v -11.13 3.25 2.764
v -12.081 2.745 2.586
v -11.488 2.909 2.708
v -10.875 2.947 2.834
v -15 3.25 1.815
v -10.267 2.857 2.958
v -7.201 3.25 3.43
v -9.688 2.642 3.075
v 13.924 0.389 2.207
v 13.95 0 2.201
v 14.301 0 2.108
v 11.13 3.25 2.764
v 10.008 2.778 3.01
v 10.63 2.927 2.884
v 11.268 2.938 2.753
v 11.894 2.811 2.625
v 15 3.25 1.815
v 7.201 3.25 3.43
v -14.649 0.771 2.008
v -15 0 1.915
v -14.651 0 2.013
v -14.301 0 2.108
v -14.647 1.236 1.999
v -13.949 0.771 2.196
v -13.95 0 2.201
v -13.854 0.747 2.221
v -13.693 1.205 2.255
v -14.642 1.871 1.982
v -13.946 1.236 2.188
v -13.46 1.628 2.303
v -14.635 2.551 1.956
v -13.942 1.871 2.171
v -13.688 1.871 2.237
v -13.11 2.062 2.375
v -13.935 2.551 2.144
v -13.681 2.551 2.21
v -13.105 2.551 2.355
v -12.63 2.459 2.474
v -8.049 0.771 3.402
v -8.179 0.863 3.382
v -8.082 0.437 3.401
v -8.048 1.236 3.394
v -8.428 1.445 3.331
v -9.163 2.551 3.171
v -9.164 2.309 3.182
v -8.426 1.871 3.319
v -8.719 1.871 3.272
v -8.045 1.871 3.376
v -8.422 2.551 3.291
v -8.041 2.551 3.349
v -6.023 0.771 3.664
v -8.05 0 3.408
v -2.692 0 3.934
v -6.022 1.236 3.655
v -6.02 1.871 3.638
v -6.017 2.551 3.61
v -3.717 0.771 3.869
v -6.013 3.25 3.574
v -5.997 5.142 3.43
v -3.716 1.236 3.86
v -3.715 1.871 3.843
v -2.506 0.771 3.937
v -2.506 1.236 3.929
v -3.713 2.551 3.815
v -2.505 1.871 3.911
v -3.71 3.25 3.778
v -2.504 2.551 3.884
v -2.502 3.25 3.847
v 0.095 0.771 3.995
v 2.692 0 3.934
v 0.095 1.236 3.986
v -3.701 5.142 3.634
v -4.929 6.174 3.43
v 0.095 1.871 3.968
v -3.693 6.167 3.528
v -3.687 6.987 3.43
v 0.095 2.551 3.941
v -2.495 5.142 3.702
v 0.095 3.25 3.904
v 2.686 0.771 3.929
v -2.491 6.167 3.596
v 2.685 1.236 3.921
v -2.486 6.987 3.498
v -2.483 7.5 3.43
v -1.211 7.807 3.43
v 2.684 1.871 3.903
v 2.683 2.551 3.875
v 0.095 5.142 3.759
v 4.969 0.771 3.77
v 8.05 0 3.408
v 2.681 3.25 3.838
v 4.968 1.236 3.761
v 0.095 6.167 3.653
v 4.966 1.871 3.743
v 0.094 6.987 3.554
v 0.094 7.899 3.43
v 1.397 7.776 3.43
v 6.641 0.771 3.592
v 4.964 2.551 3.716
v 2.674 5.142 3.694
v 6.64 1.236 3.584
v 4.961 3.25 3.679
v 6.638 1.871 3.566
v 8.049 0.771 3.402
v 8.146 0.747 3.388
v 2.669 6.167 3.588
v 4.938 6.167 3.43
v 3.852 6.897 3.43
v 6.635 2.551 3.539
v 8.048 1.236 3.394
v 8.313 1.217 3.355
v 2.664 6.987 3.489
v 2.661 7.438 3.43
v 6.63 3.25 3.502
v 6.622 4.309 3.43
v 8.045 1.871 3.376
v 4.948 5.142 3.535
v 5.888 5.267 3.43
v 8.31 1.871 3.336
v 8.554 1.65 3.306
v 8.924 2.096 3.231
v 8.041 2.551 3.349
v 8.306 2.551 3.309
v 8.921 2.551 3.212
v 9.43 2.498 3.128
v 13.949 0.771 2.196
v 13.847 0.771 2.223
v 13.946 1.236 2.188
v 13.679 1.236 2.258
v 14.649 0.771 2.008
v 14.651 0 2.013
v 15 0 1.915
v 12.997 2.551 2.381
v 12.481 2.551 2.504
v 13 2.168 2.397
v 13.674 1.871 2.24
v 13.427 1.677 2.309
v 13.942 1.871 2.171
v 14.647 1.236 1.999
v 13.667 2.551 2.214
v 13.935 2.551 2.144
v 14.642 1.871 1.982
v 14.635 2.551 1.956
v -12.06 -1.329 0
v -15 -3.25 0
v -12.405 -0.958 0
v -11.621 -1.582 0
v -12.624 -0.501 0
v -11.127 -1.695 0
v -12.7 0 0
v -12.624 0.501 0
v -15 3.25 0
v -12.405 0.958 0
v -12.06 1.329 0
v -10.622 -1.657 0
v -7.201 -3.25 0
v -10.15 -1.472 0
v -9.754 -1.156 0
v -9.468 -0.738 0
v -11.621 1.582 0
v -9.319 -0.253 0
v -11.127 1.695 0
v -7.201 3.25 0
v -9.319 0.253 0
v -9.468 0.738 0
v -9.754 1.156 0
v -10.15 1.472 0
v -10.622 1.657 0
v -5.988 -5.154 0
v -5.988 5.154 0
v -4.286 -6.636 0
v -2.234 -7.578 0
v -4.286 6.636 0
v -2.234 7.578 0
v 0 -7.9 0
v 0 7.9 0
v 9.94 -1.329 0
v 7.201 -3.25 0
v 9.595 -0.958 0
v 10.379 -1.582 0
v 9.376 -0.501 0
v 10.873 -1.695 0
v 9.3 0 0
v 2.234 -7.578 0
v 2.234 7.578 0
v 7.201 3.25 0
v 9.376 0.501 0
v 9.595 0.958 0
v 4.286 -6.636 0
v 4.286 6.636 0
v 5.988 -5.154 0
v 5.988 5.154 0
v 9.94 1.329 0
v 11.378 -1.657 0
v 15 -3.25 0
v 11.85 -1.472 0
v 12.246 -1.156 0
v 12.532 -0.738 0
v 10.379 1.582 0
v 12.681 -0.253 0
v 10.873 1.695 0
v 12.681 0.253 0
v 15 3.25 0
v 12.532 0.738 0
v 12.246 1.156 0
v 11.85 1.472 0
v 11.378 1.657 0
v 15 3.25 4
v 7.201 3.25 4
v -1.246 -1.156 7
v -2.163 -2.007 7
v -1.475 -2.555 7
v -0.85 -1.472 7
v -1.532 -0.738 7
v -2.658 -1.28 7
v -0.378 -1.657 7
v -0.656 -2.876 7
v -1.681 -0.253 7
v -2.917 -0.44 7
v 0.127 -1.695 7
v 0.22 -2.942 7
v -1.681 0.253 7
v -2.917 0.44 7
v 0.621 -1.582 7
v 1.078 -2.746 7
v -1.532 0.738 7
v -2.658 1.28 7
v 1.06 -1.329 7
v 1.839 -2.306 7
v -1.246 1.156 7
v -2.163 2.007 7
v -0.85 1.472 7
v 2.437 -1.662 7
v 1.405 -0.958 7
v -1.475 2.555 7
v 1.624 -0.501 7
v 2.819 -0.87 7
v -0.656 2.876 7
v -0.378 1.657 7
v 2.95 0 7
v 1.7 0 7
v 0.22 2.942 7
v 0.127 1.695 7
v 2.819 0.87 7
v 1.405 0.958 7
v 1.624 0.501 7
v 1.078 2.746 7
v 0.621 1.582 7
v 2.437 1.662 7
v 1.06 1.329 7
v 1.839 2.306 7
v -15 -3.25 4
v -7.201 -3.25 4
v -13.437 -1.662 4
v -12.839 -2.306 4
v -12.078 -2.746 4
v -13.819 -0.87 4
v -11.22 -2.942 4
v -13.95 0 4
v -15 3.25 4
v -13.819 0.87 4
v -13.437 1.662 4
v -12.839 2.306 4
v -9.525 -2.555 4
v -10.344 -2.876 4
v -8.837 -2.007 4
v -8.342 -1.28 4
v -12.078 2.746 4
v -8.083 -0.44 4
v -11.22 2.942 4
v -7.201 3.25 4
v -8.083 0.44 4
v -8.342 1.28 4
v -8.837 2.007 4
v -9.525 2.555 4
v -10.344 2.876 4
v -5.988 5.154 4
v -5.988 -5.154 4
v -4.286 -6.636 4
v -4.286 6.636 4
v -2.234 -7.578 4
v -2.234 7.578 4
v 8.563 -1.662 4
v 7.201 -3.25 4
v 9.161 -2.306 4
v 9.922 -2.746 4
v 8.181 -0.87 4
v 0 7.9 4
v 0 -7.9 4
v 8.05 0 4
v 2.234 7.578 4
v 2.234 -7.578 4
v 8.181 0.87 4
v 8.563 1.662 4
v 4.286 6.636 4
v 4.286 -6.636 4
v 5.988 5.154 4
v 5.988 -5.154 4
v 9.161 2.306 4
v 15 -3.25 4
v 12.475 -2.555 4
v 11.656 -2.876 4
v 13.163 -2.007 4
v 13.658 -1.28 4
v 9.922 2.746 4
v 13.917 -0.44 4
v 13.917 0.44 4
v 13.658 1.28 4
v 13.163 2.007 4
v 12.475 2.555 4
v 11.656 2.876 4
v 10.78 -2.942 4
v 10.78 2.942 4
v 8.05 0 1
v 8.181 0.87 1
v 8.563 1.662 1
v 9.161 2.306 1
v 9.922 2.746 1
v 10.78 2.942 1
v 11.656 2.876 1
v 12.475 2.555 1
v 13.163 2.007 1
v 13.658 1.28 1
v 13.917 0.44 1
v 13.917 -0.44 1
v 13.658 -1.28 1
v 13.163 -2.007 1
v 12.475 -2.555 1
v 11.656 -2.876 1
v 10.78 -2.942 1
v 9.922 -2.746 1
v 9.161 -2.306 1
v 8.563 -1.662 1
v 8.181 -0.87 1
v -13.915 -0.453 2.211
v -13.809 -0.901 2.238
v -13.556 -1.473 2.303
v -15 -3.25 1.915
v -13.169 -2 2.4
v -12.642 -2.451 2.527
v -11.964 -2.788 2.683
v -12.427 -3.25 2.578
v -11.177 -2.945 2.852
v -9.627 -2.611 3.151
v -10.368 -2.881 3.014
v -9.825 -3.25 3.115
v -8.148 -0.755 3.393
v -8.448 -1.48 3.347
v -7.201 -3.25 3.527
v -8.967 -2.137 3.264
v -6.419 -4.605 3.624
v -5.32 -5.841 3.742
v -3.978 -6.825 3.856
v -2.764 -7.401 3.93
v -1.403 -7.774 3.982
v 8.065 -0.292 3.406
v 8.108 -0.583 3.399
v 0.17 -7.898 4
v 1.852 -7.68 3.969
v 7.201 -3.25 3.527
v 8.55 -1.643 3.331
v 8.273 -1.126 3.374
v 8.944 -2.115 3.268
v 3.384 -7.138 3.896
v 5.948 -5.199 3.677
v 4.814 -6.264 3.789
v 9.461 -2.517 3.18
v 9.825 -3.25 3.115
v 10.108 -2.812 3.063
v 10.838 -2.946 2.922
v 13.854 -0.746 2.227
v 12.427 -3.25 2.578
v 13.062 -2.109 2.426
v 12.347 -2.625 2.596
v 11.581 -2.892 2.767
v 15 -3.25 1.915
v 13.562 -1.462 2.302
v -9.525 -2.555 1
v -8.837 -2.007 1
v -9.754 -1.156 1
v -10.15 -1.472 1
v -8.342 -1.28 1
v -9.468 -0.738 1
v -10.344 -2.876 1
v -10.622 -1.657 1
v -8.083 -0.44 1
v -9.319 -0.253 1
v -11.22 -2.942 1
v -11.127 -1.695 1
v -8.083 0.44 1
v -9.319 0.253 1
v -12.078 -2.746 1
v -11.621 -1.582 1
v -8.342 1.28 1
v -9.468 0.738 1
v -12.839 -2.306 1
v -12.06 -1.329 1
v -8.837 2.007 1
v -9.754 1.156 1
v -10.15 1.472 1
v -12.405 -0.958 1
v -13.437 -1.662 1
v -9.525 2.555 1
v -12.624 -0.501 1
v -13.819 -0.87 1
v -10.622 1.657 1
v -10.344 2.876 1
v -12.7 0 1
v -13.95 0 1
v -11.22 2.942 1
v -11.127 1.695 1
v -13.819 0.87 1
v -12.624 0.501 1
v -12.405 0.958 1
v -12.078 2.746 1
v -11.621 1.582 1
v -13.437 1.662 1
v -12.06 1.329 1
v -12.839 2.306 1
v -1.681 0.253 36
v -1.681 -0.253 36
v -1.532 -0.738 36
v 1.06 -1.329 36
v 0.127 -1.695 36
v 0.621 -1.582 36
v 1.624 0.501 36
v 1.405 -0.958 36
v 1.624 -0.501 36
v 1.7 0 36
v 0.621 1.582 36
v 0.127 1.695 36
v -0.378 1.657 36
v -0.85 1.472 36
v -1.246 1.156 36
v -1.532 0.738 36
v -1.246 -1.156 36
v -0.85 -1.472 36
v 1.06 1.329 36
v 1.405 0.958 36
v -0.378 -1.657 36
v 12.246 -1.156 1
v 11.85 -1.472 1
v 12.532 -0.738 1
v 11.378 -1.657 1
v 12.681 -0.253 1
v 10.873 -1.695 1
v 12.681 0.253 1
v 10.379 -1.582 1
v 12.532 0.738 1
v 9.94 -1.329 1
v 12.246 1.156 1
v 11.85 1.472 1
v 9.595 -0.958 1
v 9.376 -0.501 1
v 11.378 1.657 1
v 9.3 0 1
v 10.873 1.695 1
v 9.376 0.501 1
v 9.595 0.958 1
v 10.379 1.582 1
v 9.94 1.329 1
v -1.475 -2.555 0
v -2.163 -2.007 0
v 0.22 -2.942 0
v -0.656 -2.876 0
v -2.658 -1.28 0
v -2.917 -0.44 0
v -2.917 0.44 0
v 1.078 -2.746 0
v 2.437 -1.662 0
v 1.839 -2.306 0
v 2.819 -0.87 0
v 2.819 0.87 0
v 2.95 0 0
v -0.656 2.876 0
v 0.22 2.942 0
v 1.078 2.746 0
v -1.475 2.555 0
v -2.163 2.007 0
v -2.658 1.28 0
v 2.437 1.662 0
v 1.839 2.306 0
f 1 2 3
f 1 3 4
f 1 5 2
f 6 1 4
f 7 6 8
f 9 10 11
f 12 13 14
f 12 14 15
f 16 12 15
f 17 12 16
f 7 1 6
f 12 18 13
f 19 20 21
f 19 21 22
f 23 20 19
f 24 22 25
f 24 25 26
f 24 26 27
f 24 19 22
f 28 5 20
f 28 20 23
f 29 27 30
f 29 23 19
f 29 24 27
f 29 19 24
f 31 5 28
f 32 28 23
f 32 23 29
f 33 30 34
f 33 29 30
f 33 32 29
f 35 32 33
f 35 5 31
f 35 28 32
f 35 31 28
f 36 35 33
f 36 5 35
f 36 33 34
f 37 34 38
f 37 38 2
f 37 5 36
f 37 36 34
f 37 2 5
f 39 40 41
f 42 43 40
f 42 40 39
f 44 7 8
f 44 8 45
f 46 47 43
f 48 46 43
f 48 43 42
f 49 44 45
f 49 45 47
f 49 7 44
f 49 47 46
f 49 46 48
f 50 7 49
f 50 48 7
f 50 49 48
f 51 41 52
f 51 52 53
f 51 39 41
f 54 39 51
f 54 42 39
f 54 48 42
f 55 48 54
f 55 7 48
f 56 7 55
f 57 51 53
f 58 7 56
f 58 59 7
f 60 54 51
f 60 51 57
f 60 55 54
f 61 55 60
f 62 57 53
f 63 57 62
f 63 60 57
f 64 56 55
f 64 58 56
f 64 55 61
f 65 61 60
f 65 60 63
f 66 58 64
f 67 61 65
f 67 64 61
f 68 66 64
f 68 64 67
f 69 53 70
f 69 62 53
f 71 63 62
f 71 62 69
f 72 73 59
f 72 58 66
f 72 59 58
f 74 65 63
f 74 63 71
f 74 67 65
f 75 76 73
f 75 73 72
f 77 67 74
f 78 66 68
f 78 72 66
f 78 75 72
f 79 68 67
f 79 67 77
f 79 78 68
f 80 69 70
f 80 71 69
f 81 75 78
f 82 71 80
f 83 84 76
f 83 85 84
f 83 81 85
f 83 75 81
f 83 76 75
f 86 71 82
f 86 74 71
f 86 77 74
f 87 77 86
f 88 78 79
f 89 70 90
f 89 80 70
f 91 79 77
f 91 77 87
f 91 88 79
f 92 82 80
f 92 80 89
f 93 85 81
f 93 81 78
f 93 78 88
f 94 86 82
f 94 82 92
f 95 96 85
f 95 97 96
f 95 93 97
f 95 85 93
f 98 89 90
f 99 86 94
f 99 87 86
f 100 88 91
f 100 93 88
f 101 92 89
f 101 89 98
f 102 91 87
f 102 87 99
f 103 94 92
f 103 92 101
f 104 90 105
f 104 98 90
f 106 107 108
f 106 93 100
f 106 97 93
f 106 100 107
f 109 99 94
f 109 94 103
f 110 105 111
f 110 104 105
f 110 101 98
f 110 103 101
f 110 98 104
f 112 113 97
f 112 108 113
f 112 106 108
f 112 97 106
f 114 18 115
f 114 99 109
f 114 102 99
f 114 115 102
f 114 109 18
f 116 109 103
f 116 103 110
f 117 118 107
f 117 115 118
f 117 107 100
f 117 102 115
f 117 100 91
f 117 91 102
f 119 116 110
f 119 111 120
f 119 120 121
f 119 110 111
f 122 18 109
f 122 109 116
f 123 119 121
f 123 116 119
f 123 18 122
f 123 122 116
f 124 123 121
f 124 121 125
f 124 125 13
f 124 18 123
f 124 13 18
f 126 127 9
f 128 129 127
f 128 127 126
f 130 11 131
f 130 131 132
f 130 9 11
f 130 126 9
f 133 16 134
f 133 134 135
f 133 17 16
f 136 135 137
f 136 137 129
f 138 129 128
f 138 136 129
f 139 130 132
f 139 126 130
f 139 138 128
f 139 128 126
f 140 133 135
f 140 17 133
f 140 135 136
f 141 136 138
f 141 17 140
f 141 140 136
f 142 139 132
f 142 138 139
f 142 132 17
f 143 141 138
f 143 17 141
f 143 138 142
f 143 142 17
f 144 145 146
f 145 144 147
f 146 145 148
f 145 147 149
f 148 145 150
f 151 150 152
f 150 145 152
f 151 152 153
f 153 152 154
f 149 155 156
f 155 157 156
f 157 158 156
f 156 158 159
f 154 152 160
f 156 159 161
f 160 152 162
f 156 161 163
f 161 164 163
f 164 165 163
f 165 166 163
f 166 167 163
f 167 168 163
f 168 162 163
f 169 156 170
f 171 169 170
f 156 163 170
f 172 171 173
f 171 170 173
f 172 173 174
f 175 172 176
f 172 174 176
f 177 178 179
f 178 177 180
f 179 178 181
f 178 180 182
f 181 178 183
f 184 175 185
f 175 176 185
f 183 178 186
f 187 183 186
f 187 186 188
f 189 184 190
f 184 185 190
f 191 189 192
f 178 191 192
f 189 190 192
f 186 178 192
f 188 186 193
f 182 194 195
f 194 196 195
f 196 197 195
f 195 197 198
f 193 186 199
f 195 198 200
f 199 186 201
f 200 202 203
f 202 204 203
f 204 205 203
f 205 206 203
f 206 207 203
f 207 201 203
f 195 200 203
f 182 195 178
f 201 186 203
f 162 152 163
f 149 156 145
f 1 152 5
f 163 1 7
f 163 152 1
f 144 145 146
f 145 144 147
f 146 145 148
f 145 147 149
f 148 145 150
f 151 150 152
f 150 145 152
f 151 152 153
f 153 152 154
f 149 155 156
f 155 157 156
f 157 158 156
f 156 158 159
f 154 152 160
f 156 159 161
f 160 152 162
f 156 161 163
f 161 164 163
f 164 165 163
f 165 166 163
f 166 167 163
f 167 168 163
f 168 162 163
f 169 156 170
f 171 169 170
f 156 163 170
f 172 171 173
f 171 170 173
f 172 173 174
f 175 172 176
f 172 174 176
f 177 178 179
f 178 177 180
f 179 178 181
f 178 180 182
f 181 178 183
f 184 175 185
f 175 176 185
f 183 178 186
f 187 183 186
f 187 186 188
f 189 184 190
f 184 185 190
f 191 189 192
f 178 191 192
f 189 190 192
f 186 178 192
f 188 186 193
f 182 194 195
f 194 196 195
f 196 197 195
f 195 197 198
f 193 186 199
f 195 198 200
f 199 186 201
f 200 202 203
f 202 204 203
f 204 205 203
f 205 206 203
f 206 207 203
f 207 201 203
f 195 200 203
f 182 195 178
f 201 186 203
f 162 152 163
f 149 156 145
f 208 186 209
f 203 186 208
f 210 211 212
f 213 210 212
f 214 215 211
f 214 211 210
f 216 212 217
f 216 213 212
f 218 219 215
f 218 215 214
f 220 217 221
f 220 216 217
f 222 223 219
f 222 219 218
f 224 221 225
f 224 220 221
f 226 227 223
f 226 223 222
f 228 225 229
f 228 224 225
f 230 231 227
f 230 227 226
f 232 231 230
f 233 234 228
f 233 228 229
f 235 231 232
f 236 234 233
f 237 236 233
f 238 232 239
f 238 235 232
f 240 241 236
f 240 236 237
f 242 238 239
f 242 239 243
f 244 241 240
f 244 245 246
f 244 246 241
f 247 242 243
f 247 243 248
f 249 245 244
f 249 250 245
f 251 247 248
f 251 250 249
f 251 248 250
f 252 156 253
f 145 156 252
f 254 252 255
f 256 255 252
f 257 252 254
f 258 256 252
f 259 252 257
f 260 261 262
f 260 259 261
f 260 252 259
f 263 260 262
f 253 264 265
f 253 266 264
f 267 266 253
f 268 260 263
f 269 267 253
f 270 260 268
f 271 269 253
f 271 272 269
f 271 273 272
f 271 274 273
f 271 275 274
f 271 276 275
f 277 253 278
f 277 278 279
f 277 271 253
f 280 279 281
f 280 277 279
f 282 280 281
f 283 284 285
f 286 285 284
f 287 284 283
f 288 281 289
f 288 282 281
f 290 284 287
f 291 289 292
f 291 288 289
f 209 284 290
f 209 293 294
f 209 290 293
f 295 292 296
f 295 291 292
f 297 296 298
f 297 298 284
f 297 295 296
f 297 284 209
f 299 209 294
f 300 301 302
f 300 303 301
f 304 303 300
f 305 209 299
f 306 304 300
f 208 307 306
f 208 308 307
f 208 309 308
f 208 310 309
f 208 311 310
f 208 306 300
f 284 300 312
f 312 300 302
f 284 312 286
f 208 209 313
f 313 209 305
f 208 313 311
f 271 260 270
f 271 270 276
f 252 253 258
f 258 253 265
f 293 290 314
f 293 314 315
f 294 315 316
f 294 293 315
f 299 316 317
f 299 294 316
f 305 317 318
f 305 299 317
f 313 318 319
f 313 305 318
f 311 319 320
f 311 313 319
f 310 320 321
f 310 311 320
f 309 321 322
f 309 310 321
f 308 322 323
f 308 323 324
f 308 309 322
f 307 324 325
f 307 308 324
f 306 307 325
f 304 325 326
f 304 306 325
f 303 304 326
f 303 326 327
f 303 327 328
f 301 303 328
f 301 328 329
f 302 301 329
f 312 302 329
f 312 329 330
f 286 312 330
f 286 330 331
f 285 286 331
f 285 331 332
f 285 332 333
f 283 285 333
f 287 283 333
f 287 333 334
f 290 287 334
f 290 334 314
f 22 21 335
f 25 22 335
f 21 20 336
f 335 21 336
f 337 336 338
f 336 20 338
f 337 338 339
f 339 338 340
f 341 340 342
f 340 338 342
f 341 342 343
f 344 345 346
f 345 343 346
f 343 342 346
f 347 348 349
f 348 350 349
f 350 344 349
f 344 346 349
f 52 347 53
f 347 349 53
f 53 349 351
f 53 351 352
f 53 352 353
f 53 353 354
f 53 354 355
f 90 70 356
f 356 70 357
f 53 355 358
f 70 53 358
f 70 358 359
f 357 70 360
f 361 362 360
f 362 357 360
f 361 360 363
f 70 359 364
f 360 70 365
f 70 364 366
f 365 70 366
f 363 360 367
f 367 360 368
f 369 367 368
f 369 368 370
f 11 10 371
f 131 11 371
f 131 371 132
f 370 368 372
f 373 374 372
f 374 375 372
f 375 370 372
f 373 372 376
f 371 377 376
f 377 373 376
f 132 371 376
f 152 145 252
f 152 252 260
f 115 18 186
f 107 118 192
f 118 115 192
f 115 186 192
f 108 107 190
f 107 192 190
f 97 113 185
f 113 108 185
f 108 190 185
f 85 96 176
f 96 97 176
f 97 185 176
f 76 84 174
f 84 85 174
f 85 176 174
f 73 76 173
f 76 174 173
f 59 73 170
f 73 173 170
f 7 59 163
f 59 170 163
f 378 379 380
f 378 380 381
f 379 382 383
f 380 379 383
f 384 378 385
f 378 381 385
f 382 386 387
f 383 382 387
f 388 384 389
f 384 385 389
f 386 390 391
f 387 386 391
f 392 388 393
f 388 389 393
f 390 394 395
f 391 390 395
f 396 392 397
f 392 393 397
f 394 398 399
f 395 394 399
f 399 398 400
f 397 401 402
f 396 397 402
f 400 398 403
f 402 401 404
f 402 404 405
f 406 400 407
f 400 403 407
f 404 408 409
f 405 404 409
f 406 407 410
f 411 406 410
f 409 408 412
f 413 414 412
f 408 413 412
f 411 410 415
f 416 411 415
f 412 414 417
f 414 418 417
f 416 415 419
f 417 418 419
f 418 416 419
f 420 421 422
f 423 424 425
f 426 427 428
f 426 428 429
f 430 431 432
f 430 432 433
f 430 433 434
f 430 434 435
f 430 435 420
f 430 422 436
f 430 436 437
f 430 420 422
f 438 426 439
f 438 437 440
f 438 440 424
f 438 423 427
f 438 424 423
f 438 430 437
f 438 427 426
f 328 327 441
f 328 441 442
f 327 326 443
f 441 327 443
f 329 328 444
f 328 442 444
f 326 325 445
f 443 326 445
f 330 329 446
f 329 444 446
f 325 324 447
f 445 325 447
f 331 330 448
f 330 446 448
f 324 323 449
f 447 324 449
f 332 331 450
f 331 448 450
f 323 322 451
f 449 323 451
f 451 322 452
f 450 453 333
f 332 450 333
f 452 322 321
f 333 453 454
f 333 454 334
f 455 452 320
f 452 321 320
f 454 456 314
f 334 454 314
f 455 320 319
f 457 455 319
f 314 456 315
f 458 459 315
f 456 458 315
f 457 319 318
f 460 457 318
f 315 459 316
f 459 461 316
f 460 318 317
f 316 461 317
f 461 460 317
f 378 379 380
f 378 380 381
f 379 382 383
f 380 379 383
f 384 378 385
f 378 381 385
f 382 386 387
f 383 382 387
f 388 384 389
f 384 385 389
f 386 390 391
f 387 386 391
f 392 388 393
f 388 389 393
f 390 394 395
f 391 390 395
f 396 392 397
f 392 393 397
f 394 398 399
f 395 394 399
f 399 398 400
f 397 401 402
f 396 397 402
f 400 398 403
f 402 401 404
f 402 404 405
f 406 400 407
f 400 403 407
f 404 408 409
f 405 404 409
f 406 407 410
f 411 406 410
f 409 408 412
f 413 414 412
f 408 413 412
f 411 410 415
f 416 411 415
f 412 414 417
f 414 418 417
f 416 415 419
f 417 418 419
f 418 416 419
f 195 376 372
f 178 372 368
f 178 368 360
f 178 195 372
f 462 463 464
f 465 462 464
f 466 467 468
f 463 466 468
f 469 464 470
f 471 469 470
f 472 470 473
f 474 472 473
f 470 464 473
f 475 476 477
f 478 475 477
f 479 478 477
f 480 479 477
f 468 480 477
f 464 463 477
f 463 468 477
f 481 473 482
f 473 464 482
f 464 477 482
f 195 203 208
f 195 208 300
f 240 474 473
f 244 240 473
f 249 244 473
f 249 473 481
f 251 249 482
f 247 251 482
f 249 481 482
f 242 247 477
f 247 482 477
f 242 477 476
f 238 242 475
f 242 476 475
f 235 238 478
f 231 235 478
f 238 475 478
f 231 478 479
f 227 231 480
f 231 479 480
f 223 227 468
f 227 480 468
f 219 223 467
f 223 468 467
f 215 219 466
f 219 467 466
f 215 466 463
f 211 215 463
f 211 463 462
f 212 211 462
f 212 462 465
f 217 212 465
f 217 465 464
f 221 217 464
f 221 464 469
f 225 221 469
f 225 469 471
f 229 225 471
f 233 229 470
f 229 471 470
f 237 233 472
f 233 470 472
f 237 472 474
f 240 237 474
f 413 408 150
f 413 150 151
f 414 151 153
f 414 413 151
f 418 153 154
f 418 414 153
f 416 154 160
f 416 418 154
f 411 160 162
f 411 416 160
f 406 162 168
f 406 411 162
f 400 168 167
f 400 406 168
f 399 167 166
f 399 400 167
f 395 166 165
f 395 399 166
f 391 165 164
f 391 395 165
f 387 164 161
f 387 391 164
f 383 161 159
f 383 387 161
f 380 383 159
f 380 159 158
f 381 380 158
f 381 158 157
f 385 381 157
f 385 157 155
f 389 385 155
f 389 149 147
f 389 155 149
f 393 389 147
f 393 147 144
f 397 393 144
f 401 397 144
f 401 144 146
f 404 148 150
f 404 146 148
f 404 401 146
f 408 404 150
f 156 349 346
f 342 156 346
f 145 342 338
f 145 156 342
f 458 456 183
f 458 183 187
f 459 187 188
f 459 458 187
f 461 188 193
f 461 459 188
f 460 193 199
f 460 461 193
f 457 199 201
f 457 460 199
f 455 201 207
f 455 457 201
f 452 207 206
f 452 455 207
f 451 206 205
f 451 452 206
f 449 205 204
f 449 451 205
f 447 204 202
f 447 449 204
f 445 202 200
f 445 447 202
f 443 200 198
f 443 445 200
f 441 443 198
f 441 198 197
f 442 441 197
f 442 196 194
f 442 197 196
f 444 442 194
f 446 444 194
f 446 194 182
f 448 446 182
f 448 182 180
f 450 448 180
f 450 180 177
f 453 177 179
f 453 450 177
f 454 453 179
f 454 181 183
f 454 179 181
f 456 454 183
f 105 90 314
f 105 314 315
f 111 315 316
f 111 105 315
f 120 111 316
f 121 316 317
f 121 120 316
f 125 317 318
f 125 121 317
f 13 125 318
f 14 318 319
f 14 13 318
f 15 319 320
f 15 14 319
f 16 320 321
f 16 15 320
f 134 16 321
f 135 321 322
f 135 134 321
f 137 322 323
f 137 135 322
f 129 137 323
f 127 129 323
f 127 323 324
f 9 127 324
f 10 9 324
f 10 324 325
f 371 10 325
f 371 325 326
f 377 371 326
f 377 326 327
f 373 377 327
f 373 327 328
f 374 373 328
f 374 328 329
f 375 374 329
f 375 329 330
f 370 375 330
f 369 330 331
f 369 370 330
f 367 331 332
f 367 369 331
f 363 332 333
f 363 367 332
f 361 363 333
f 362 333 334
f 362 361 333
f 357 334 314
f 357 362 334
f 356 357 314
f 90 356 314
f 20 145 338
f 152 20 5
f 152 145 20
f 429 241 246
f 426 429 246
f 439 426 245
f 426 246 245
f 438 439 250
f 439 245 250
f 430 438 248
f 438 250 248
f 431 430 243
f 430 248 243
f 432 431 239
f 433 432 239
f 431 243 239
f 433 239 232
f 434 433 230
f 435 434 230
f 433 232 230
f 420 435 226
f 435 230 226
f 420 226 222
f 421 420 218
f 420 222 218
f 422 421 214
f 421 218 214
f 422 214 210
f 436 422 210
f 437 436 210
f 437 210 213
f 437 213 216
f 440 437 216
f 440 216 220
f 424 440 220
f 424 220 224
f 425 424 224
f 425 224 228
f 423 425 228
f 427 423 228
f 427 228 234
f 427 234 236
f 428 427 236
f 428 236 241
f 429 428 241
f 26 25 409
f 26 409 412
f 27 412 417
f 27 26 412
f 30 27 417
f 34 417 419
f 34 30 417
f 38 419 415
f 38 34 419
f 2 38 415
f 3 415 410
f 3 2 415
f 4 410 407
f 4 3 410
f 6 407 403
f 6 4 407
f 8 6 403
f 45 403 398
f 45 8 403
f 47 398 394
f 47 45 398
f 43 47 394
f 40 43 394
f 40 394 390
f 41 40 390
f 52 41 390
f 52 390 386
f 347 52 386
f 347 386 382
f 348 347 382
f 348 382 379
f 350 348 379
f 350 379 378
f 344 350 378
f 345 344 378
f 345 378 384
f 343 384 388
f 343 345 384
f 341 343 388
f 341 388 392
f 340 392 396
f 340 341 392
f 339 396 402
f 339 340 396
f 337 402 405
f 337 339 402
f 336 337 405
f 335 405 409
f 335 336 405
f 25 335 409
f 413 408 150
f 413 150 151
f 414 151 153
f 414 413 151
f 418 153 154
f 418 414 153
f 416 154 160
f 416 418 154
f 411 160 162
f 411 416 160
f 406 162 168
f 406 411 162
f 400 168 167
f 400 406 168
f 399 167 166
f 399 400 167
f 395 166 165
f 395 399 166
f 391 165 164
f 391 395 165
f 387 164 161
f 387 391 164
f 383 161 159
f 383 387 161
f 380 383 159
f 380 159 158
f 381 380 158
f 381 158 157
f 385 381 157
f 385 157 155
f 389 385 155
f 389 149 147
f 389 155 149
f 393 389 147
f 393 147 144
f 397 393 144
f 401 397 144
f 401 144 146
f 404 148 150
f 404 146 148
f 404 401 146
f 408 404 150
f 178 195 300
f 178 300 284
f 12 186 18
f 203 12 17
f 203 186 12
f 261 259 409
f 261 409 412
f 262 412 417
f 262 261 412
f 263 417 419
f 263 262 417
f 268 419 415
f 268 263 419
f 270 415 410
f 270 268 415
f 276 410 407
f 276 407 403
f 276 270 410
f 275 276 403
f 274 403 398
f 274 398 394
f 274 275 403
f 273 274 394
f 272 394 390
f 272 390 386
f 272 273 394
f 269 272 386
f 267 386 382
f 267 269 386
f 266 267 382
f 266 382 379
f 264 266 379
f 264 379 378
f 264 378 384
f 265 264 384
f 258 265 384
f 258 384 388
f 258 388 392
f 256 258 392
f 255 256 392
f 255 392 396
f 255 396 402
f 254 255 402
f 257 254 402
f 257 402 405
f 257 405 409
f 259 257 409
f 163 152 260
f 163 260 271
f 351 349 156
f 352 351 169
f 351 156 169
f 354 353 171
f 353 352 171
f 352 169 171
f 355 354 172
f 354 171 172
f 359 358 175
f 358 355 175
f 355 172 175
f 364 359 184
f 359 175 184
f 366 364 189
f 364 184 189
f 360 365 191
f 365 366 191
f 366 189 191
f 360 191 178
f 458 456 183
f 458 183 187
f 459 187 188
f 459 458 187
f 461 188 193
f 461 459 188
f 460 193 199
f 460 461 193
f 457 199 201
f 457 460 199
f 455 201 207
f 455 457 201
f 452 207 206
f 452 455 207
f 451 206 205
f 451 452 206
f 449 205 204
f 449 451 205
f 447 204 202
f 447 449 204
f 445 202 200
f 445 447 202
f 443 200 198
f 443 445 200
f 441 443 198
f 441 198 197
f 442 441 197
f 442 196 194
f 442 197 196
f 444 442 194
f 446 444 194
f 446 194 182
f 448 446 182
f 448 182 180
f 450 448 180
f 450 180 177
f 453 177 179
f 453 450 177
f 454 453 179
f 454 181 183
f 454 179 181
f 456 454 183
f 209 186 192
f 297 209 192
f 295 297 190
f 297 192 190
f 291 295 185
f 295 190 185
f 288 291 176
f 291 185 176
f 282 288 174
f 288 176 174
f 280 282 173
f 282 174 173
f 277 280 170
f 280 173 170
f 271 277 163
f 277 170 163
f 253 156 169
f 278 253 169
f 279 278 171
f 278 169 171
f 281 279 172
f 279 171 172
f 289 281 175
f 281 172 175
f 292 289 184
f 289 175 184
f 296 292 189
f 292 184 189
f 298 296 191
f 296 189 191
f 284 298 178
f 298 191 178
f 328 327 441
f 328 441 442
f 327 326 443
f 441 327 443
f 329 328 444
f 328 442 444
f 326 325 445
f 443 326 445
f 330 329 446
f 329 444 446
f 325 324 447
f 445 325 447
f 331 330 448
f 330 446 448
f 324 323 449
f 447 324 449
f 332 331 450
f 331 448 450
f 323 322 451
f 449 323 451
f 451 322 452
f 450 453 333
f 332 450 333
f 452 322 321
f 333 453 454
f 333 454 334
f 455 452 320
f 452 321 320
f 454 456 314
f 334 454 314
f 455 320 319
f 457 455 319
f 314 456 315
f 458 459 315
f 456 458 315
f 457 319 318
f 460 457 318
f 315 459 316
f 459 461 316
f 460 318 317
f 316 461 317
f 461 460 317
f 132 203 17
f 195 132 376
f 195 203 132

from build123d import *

# Parameters (mm, degrees)
CYLINDER_R               = 2.95
CYLINDER_DEPTH           = 7
CYLINDER001_R            = 1.7
CYLINDER001_DEPTH        = 30
CLONE060_PLACEMENT_ANGLE = 180
CLONE059_PLACEMENT_ANGLE = 180
PAD010_DEPTH             = 4


with BuildPart() as m3bolthead:
    # Cylinder → Cylinder (new body)
    with BuildSketch(Plane.XY):
        Circle(CYLINDER_R)
    extrude(amount=CYLINDER_DEPTH)


with BuildPart() as m3bolt:
    # Cylinder001 → Cylinder001 (new body)
    with BuildSketch(Plane.XY.offset(6)):
        Circle(CYLINDER001_R)
    extrude(amount=CYLINDER001_DEPTH)

    # Fusion: union M3BoltHead
    add(m3bolthead.part)


with BuildPart() as clone_of_m3bolt020:
    # Clone060 base: copy of M3Bolt
    add(m3bolt.part)


with BuildPart() as clone_of_m3bolt020_1:
    # Clone060 placement: moved
    add(clone_of_m3bolt020.part.moved(Location((-11, 0, 8))).rotate(Axis((-11, 0, 8), (0, 1, 0)), CLONE060_PLACEMENT_ANGLE))


with BuildPart() as fusion020:
    # Clone059 base: copy of M3Bolt
    add(m3bolt.part)


with BuildPart() as fusion020_1:
    # Clone059 placement: moved
    add(fusion020.part.moved(Location((11, 0, 8))).rotate(Axis((11, 0, 8), (0, 1, 0)), CLONE059_PLACEMENT_ANGLE))

    # Fusion020: union Clone of M3Bolt020
    add(clone_of_m3bolt020_1.part)


with BuildPart() as f_622zzbearingfixmasterext:
    # Sketch017 → Pad010 (new body)
    with BuildSketch(Plane.XY):
        with BuildLine():
            ThreePointArc((-7.200521, -3.25), (0, -7.9), (7.200521, -3.25))
            Line((15, -3.25), (7.200521, -3.25))
            Line((15, 3.25), (15, -3.25))
            Line((7.200521, 3.25), (15, 3.25))
            ThreePointArc((7.200521, 3.25), (0, 7.9), (-7.200521, 3.25))
            Line((-15, 3.25), (-7.200521, 3.25))
            Line((-15, -3.25), (-15, 3.25))
            Line((-7.200521, -3.25), (-15, -3.25))
        make_face()
    extrude(amount=PAD010_DEPTH)

    # Cut021: cut Fusion020
    add(fusion020_1.part, mode=Mode.SUBTRACT)


with BuildPart() as revolution014:
    # Sketch064 → Revolution014 (revolve)
    with BuildSketch(Plane(origin=(0, 0, -51), x_dir=(0, 1, 0), z_dir=(-1, 0, 0))):
        with BuildLine():
            ThreePointArc((0, -55), (16.583124, -52.440442), (31.622777, -45))
            Line((-8.377223, -45), (31.622777, -45))
            Line((-8.377223, -45), (-8.377223, -55))
            Line((0, -55), (-8.377223, -55))
        make_face()
    revolve(axis=Axis((0, 0, -51), (0, 1, 0)))


with BuildPart() as art4bearingfix:
    # Clone309 base: copy of 622zzBearingFixMasterExt
    add(f_622zzbearingfixmasterext.part)

    # Common: intersect Revolution014
    add(revolution014.part, mode=Mode.INTERSECT)


solid = Compound([m3bolt.part, f_622zzbearingfixmasterext.part, art4bearingfix.part])
